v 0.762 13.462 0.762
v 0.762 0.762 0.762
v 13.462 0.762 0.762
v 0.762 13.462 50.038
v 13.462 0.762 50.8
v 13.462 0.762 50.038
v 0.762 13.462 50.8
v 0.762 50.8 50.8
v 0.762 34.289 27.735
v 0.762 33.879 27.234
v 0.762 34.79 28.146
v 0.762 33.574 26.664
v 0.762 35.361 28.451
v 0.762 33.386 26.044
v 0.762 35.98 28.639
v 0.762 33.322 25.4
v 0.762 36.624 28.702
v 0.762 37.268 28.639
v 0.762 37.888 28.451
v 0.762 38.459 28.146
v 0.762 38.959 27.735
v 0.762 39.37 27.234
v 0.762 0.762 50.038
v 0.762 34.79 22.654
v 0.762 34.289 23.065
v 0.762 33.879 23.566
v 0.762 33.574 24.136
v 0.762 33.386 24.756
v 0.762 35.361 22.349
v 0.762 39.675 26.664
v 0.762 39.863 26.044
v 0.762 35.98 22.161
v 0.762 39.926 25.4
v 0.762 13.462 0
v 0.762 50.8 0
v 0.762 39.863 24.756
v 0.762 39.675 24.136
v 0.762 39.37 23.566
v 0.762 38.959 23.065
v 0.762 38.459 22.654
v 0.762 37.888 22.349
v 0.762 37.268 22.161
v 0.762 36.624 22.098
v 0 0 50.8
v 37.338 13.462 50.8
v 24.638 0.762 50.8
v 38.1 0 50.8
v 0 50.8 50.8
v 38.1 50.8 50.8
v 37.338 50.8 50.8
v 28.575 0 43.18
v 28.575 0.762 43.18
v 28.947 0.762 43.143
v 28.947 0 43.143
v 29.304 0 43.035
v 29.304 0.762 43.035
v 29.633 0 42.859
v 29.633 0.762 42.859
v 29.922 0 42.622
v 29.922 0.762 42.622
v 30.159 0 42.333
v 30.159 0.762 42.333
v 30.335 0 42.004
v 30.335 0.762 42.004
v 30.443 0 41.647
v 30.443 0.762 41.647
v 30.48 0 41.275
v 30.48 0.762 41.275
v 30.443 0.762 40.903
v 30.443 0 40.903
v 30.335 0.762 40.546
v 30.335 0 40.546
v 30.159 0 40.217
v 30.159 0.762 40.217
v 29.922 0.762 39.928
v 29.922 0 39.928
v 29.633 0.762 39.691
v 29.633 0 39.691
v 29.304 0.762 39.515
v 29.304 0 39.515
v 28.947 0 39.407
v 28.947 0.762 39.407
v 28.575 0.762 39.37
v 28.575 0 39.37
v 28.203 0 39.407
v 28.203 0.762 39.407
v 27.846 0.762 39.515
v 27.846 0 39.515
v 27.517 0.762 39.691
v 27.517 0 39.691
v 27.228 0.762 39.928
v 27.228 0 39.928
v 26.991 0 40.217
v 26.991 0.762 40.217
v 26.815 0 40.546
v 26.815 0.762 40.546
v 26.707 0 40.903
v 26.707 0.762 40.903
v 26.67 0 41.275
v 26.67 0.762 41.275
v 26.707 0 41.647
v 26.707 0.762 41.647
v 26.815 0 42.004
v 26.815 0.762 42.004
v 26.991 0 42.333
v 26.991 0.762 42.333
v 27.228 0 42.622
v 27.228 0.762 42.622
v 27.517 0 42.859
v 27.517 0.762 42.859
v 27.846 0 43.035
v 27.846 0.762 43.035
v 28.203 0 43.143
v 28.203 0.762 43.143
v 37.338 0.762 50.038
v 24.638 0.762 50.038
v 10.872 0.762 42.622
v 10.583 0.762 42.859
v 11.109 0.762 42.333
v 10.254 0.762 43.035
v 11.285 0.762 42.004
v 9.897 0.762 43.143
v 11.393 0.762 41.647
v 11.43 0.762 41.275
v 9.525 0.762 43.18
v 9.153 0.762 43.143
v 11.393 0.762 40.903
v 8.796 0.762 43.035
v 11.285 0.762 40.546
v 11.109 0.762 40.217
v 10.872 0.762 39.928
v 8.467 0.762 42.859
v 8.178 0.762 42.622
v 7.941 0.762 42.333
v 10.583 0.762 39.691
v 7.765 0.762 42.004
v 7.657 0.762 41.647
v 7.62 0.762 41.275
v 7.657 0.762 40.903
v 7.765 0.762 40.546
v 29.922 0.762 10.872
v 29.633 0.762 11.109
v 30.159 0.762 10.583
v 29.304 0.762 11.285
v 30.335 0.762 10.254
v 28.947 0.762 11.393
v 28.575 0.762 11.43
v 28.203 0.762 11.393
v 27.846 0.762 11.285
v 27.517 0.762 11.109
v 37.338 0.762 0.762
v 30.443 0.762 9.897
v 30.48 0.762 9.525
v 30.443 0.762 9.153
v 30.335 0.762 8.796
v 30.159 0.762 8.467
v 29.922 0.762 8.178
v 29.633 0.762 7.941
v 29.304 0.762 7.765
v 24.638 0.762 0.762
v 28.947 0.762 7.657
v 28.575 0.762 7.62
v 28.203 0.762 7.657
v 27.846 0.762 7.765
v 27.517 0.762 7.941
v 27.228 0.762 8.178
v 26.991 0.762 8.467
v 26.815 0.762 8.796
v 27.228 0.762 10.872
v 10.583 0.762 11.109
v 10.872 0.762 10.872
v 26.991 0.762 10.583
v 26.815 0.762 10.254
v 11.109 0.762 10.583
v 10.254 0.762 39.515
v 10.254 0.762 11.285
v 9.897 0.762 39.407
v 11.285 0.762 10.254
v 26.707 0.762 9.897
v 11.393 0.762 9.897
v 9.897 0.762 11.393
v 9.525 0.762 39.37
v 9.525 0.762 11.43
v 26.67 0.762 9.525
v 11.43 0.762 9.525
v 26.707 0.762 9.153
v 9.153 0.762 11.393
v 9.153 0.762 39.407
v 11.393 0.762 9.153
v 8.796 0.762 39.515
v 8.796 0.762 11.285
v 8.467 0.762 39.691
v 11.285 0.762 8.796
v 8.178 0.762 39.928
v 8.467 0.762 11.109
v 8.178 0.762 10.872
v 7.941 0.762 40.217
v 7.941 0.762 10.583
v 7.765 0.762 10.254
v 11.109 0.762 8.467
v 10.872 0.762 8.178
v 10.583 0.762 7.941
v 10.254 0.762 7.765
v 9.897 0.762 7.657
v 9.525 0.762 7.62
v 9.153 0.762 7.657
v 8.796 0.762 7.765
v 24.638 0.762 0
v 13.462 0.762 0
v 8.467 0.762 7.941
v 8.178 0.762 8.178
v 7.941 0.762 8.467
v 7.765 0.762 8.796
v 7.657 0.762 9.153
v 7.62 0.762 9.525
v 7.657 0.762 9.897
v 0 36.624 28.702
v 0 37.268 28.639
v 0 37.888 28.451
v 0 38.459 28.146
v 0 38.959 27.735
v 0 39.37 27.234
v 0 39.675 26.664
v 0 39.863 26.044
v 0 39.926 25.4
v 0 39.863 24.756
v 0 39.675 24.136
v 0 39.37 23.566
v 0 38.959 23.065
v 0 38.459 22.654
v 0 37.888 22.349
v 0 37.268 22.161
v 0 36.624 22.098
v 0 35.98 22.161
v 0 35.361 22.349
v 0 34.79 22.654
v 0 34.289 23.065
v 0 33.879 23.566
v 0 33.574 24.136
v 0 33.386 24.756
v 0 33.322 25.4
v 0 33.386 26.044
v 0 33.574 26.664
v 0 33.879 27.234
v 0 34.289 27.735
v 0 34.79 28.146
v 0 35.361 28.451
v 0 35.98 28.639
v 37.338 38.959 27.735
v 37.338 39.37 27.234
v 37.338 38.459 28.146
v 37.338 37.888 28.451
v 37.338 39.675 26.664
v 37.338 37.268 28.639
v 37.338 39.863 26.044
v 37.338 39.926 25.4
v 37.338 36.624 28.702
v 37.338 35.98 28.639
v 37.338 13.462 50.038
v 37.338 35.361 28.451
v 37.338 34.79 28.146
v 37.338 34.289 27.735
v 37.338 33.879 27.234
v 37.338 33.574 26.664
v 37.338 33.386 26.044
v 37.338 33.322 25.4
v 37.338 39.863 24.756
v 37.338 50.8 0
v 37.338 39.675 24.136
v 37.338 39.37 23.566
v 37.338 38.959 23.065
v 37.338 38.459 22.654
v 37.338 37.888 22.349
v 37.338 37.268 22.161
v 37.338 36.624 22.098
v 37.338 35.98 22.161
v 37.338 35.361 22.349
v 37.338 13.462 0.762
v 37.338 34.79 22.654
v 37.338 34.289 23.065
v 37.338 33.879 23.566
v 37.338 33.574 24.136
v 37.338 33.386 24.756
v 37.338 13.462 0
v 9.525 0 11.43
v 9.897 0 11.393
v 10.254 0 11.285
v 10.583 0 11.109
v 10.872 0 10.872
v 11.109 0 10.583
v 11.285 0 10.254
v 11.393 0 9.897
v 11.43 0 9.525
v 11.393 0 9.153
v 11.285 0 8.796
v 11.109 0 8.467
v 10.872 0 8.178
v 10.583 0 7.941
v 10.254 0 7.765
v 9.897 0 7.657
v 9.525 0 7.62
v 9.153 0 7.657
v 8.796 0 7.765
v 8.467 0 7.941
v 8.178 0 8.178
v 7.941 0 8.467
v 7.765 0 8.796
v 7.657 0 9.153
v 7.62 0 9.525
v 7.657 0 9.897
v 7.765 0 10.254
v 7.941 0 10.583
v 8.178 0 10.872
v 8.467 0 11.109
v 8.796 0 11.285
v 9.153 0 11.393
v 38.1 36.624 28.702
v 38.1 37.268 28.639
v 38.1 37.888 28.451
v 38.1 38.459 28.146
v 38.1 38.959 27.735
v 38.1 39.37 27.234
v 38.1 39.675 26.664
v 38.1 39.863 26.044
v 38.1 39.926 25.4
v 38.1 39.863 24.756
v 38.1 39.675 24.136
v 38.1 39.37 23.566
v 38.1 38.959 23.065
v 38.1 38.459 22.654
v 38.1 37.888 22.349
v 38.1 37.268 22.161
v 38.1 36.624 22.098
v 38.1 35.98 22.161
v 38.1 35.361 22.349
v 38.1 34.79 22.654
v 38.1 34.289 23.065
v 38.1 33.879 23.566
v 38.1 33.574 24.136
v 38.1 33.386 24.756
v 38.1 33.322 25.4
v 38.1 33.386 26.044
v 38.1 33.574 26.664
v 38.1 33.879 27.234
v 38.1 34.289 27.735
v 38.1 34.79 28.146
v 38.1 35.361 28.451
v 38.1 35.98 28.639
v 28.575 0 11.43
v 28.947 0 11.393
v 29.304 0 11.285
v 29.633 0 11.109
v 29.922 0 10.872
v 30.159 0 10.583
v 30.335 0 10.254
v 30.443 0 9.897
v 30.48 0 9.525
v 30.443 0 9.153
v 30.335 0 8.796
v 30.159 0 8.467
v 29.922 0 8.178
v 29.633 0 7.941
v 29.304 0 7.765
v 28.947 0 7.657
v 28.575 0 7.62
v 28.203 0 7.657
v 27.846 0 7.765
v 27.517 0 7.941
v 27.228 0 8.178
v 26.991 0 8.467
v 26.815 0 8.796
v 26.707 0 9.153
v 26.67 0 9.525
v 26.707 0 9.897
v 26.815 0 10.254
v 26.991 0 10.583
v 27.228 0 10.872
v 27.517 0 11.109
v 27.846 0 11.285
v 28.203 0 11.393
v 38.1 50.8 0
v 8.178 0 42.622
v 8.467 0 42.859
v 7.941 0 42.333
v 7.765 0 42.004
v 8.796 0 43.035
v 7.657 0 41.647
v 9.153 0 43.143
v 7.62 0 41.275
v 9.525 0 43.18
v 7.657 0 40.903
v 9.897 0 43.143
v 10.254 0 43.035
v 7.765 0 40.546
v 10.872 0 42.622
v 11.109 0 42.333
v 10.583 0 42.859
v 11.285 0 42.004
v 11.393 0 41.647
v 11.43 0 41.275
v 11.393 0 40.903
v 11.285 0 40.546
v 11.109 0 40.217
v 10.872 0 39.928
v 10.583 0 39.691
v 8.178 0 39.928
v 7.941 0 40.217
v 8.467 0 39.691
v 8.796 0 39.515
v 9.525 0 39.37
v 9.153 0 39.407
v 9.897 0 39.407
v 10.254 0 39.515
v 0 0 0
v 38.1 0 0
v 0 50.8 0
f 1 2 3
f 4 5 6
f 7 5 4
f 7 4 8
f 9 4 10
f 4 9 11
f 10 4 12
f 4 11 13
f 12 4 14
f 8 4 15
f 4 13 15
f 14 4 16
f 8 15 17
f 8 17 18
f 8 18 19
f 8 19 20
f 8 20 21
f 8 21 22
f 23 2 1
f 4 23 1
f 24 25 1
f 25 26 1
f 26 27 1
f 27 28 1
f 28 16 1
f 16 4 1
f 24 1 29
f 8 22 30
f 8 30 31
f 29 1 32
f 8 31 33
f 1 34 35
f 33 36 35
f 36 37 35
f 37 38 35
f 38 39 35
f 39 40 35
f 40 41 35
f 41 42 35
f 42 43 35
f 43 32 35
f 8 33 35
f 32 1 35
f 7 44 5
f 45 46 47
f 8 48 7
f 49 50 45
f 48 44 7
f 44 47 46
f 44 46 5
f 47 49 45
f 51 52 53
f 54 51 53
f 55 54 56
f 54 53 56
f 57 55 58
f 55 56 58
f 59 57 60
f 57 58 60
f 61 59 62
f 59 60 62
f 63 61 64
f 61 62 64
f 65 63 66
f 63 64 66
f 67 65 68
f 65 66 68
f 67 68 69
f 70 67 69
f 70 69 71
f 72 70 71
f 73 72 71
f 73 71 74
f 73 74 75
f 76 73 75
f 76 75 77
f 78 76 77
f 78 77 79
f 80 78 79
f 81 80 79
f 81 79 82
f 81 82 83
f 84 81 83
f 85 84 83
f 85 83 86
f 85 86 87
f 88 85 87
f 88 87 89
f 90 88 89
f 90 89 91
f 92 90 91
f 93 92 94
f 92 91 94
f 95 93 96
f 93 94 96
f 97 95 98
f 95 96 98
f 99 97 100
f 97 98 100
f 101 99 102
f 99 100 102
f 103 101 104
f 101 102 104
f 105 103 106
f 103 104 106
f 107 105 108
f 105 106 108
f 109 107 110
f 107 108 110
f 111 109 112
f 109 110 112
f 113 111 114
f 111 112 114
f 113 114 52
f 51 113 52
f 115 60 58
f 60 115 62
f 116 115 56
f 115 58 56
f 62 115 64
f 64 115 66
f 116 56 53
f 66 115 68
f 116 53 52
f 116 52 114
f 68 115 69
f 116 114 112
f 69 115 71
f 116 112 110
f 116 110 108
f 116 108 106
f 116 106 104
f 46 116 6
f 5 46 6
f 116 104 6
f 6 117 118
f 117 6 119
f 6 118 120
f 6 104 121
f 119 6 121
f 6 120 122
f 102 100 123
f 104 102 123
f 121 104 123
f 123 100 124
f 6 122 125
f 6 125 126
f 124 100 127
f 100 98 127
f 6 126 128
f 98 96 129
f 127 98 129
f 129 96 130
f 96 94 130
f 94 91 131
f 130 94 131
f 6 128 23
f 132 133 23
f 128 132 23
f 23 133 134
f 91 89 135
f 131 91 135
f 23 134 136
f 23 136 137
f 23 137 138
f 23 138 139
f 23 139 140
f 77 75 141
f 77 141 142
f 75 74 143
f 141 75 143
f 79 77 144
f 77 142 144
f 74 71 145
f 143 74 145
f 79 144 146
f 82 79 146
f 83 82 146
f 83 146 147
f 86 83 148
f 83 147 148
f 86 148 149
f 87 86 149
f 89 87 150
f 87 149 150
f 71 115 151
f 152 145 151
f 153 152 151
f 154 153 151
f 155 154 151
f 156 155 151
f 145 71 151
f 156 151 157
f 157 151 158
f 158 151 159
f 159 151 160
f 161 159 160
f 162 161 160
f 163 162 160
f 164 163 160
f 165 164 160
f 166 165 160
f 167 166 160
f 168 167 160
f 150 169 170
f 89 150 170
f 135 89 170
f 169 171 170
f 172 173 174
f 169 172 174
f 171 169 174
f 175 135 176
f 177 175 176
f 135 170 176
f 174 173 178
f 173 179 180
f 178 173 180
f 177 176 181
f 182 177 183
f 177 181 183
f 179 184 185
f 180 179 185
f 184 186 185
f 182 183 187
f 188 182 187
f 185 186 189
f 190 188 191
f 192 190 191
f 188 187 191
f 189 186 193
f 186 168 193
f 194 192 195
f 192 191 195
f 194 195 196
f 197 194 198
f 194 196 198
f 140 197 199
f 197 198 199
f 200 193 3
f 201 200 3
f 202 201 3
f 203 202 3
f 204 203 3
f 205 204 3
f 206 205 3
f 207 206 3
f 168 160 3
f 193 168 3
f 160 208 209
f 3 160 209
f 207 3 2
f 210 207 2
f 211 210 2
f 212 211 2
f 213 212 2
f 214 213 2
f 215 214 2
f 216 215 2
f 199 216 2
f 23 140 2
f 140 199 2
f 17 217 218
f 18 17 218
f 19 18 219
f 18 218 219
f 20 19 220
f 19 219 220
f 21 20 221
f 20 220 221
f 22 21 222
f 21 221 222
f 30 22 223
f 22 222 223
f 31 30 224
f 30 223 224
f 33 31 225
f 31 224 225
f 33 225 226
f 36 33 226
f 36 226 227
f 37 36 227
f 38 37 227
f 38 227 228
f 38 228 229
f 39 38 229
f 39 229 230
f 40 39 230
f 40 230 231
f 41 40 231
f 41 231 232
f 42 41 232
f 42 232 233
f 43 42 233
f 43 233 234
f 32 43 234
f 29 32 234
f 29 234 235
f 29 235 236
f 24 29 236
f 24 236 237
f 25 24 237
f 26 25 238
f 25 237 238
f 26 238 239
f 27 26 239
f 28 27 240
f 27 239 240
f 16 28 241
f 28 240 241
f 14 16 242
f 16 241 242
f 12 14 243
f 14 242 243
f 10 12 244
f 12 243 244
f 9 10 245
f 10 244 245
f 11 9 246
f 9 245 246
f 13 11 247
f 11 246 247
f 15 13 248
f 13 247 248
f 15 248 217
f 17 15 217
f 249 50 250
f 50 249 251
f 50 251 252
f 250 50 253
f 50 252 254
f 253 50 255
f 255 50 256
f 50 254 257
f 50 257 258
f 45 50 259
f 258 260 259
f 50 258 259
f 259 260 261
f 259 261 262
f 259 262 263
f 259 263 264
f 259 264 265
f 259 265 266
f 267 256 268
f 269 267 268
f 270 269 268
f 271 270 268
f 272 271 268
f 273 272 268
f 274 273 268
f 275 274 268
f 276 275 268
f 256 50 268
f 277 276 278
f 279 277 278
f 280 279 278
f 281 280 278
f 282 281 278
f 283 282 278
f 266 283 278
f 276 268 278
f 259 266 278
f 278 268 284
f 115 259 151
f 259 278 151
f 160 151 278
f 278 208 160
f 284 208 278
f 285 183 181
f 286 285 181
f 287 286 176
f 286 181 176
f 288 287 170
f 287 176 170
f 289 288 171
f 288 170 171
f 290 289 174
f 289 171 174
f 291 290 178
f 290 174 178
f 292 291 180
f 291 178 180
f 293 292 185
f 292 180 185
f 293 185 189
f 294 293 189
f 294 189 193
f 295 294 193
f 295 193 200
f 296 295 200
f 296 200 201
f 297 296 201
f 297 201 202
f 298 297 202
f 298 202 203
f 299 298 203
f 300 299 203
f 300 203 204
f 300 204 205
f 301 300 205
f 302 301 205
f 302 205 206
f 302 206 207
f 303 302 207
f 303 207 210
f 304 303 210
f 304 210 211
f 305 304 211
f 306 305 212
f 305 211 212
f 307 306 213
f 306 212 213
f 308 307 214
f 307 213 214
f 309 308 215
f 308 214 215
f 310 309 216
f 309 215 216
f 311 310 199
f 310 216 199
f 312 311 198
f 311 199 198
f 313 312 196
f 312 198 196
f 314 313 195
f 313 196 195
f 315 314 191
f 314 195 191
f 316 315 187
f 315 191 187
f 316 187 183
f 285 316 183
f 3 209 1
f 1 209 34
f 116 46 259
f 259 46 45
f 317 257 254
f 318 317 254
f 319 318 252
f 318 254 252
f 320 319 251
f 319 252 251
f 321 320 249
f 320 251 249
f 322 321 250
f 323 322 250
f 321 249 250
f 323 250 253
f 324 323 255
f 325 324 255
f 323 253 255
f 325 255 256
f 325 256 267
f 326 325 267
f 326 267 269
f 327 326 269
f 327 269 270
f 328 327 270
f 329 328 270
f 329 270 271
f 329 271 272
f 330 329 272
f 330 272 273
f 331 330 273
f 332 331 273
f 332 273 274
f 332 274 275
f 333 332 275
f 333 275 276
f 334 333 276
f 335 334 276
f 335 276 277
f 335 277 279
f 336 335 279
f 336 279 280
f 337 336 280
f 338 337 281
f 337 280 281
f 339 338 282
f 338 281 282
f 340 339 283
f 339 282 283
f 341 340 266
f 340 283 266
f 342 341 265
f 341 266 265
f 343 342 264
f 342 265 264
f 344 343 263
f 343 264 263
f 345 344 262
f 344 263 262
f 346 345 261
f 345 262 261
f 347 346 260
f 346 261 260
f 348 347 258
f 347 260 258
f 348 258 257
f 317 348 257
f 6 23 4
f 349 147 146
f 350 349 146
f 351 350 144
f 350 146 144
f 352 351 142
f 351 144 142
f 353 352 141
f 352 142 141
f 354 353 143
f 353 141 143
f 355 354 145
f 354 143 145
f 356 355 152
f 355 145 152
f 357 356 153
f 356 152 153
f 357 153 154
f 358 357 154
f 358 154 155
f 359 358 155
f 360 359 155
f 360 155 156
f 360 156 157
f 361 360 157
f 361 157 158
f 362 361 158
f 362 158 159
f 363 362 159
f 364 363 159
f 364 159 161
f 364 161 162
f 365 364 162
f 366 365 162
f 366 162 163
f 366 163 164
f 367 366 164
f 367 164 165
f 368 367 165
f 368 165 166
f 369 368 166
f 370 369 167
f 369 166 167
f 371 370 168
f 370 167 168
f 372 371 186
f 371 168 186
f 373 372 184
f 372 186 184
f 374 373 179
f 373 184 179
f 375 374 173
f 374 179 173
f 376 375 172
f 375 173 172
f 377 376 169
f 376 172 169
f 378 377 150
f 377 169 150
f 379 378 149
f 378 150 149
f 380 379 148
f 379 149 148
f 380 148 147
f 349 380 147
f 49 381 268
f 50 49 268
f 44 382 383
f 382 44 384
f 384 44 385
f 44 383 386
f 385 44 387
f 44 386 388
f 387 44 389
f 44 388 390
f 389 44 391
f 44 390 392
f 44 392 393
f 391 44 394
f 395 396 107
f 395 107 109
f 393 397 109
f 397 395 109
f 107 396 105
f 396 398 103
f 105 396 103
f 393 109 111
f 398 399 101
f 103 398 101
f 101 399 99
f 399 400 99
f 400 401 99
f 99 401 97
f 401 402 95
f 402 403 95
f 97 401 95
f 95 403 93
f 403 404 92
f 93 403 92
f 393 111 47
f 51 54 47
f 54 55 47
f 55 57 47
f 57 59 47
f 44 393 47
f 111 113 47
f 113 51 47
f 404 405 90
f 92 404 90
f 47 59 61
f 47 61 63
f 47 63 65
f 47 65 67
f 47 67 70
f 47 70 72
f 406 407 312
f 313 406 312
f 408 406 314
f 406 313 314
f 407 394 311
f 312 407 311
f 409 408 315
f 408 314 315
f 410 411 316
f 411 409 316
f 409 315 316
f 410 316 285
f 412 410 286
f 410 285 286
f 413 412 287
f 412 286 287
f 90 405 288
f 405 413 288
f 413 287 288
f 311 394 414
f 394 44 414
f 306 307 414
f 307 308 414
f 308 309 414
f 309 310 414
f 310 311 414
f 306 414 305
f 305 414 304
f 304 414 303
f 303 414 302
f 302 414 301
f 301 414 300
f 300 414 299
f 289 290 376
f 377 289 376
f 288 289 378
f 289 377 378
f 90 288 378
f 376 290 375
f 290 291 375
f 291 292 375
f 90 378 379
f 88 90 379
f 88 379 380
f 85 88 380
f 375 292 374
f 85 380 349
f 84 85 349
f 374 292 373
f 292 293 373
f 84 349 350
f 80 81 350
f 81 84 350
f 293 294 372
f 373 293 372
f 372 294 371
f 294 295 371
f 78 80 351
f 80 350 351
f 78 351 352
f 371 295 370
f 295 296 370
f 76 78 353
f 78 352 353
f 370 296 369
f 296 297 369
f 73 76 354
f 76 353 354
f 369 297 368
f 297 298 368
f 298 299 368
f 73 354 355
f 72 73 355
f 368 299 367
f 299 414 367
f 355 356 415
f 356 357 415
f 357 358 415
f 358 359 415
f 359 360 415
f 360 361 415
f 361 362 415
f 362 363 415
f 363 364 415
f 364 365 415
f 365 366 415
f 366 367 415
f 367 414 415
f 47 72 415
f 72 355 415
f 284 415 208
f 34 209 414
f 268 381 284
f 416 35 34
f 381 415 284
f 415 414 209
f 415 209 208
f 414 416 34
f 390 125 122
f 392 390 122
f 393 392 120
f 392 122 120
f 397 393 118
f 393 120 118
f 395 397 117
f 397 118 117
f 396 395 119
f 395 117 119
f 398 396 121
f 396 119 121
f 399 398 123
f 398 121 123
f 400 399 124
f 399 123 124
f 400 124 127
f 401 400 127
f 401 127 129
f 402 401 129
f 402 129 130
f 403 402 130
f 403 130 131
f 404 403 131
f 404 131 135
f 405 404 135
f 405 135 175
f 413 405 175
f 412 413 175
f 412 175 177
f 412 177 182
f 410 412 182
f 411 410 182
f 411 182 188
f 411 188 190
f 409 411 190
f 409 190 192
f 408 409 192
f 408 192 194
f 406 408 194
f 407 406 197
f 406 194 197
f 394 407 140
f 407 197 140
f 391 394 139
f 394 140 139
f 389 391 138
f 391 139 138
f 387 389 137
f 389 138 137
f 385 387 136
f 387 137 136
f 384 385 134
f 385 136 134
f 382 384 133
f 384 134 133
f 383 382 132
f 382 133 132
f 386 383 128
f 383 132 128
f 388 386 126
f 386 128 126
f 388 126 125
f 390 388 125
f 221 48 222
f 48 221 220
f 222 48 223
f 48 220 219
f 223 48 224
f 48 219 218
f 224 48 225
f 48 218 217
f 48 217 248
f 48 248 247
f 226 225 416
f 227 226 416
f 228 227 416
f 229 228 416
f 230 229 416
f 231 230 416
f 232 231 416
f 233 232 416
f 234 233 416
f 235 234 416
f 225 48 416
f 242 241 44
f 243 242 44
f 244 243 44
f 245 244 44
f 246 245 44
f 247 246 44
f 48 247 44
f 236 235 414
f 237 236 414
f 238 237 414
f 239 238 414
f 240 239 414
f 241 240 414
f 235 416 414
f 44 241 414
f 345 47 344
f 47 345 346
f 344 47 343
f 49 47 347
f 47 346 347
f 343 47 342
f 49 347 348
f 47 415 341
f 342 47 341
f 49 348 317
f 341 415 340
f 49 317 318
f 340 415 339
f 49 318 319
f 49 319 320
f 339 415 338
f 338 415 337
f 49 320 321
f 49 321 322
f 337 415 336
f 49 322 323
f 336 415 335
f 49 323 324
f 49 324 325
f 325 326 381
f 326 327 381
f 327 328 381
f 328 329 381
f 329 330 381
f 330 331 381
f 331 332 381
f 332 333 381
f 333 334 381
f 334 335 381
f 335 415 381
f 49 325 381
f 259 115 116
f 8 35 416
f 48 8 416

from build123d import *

# Parameters (mm, degrees)
BOSS_EXTRUDE1_DEPTH = 50.8
BOSS_EXTRUDE2_DEPTH = 0.762
BOSS_EXTRUDE3_DEPTH = 0.762
SKETCH4_R           = 3.302
CUT_EXTRUDE1_DEPTH  = 82.319677815
SKETCH5_R           = 1.905
CUT_EXTRUDE2_DEPTH  = 81.845849887


with BuildPart() as part:
    # Sketch1 → Boss-Extrude1 (new body)
    with BuildSketch(Plane.XY):
        Polygon((0, 0), (38.1, 0), (38.1, 50.8), (37.338, 50.8), (37.338, 0.762), (0.762, 0.762), (0.762, 50.8), (0, 50.8), align=None)
    extrude(amount=BOSS_EXTRUDE1_DEPTH)

    # Sketch2 → Boss-Extrude2 (add)
    with BuildSketch(Plane.XY.offset(50.8)):
        Polygon((0.762, 0.762), (13.462, 0.762), (0.762, 13.462), align=None)
        Polygon((37.338, 0.762), (24.638, 0.762), (37.338, 13.462), align=None)
    extrude(amount=-BOSS_EXTRUDE2_DEPTH)

    # Sketch3 → Boss-Extrude3 (add)
    with BuildSketch(Plane(origin=(0, 0, 0), x_dir=(-1, 0, 0), z_dir=(0, 0, -1))):
        Polygon((-37.338, 13.462), (-37.338, 0.762), (-24.638, 0.762), align=None)
        Polygon((-0.762, 0.762), (-13.462, 0.762), (-0.762, 13.462), align=None)
    extrude(amount=-BOSS_EXTRUDE3_DEPTH)

    # Sketch4 → Cut-Extrude1 (cut, through all)
    with BuildSketch(Plane.ZY):
        with Locations((25.4, 36.624302666)):
            Circle(SKETCH4_R)
    extrude(amount=-CUT_EXTRUDE1_DEPTH, mode=Mode.SUBTRACT)

    # Sketch5 → Cut-Extrude2 (cut, through all)
    with BuildSketch(Plane(origin=(0, 0.762, 0), x_dir=(1, 0, 0), z_dir=(0, 1, 0))):
        with Locations(Location((9.525, -9.525, 0), (0, 0, 270))):
            Circle(SKETCH5_R)
        with Locations(Location((9.525, -41.275, 0), (0, 0, 270))):
            Circle(SKETCH5_R)
        with Locations(Location((28.575, -41.275, 0), (0, 0, 270))):
            Circle(SKETCH5_R)
        with Locations(Location((28.575, -9.525, 0), (0, 0, 270))):
            Circle(SKETCH5_R)
    extrude(amount=-CUT_EXTRUDE2_DEPTH, mode=Mode.SUBTRACT)


solid = part.part
